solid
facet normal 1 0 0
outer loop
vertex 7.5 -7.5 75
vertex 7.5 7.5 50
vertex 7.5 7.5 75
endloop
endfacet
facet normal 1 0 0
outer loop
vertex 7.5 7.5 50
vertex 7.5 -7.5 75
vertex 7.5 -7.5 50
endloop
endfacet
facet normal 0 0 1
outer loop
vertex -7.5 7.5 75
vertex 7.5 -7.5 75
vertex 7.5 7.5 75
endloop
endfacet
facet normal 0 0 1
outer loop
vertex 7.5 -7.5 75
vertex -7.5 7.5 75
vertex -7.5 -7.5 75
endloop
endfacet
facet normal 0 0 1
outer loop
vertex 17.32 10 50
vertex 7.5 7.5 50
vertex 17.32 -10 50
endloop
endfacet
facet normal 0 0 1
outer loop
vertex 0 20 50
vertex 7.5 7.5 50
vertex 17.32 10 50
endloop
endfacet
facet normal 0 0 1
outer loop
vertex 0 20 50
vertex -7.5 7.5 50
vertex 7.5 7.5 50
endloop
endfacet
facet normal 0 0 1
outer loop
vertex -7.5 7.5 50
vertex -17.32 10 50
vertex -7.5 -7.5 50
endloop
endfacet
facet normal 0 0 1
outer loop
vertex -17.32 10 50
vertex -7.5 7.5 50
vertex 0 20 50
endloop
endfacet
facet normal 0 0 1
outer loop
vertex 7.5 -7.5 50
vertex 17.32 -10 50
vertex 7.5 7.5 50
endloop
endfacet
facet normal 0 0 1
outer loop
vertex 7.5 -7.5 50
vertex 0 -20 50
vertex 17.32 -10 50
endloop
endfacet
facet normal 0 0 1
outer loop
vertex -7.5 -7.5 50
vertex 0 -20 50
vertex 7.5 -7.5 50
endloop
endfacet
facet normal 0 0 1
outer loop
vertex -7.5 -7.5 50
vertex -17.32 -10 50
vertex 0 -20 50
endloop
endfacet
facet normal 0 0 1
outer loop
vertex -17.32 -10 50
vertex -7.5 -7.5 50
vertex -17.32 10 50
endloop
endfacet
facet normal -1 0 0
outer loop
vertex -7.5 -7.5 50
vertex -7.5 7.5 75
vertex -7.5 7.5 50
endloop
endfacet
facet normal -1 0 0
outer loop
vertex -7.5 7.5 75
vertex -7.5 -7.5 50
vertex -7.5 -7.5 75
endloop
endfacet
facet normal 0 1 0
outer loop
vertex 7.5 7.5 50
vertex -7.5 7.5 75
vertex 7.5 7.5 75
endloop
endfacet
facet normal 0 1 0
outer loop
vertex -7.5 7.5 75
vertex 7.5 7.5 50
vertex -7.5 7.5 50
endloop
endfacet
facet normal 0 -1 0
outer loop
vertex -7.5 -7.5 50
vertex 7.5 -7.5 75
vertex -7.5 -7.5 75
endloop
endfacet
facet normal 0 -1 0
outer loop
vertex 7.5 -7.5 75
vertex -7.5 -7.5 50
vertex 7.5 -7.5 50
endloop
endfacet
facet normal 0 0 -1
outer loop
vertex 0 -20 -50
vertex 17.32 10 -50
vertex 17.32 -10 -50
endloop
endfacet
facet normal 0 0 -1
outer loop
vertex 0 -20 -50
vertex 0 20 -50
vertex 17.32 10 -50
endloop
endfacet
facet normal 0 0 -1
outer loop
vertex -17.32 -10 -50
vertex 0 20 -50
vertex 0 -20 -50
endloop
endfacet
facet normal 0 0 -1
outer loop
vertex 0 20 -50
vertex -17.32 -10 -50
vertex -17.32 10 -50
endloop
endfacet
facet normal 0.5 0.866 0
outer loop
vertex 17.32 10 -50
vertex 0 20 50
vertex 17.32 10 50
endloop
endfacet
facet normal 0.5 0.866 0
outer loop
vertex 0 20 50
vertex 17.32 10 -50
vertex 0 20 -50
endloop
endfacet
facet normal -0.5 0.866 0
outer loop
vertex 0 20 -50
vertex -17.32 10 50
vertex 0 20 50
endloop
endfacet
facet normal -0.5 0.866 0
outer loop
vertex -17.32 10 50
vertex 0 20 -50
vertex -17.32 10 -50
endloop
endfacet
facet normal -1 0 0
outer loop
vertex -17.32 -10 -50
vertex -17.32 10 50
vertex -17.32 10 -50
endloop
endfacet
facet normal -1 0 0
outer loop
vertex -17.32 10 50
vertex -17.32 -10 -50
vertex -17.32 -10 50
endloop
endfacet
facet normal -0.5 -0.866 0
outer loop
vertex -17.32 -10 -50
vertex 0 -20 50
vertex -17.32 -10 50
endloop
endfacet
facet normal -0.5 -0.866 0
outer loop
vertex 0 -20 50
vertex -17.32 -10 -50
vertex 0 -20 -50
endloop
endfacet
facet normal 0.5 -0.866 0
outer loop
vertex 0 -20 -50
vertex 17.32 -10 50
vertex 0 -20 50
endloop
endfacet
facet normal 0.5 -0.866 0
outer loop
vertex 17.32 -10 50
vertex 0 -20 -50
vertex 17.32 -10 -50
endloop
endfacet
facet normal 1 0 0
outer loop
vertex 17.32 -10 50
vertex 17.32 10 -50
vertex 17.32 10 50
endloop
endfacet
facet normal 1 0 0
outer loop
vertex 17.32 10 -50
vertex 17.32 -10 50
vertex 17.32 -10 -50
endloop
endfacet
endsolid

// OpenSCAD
// file: libpeginhole.scad
/*
 *  Copyright 2024-2025 AGH Center of Excellence in Artificial Intelligence
 *
 *  Licensed under the Apache License, Version 2.0 (the "License");
 *  you may not use this file except in compliance with the License.
 *  You may obtain a copy of the License at
 *
 *      http://www.apache.org/licenses/LICENSE-2.0
 *
 *  Unless required by applicable law or agreed to in writing, software
 *  distributed under the License is distributed on an "AS IS" BASIS,
 *  WITHOUT WARRANTIES OR CONDITIONS OF ANY KIND, either express or implied.
 *  See the License for the specific language governing permissions and
 *  limitations under the License.
 */
EPS = 0.001;

function circle_coordinate(x, r, p) = [ r * cos(x + p), r *sin(x + p) ];
function regular_shape_vertices(n = 3, r = 1, phase = 0) = [for (t = [0:360 / n:360 - EPS]) circle_coordinate(t, r, phase)];

function hole_diameter(vertices, peg_diameter, tolerance = 0) = tolerance + peg_diameter * cos(180 / vertices);
function angle_offset(vertices) = (360 / vertices) / 2;


/* Makes a single peg in form of regular prism
-  Args:
- @vertices: int - number of the base polygon vertices
- @diameter: num - the diameter of the circle to construct the vertices
- @height: num - the height of the prism
- @angle_offset: num - rotation of all vertices
- @is_cylinder: bool - flag to convert prism into cylinder
*/
module regular_prism(vertices, diameter, height, angle_offset, is_cylinder = false)
{
	if (is_cylinder) {
		cylinder(h = height, r = diameter / 2, center = true);
	} else if (vertices < 3) {
		echo("ERROR: Can't construct polygon with less than 3 vertices!");
	} else {
		linear_extrude(height = height, center = true) {
			if (vertices == 4) {
				square(diameter / sqrt(2), center = true);
			} else {
				points = regular_shape_vertices(n = vertices, r = diameter / 2, phase = angle_offset);
				polygon(points);
			}
		}
	}
}

/* Makes a single peghole
-  Args:
- @slot_size: num - the side of the box
- @depth: num - the thickness of the surface for insertion
- @height: num - the height of the whole box
- @leg_width: num - the side of the supporting legs
*/
module single_insertion_box(slot_size, depth, height, leg_width) {
	difference() {
		// Insertion surface
		cube([ slot_size, slot_size, height ], center = true);

		// Clearance (4 legs)
		translate([ 0, 0, -depth ]) cube([ slot_size + EPS, slot_size - 2 * leg_width, height ], center = true);
		translate([ 0, 0, -depth ]) cube([ slot_size - 2 * leg_width, slot_size + EPS, height ], center = true);

		// Peghole
		children(0);
	}
}

/* Makes multiple pegholes
-  Args:
- @slot_size: num - the side of the box
- @array_size: vec[int, int] - array dimensions of the holes grid
- @depth: num - the thickness of the surface for insertion
- @height: num - the height of the whole box
- @leg_width: num - the side of the supporting legs
*/
module multiple_insertion_box(slot_size, array_size, depth, height, leg_width) {
	box_dims = slot_size * array_size;
	difference() {
		// Insertion surface
		cube([ box_dims.x, box_dims.y, height ], center = true);

		// Clearance (4 legs)
		translate([ 0, 0, -depth ]) cube([ box_dims.x + EPS, box_dims.y - 2 * leg_width, height ], center = true);
		translate([ 0, 0, -depth ]) cube([ box_dims.x - 2 * leg_width, box_dims.y + EPS, height ], center = true);

		// Pegholes array
		array_offset = -box_dims / 2 + [ slot_size, slot_size ] / 2;
		for (cnt_y = [0:1:array_size.y - EPS]) {
			for (cnt_x = [0:1:array_size.x - EPS]) {
				dx = slot_size * cnt_x;
				dy = slot_size * cnt_y;
				child_idx = ((cnt_y * array_size.x) + cnt_x) % $children;

				translate([ array_offset.x + dx, array_offset.y + dy, 0 ]) children(child_idx);
			}
		}
	}
}
// main file
/*
 *  Copyright 2025 AGH Center of Excellence in Artificial Intelligence
 *
 *  Licensed under the Apache License, Version 2.0 (the "License");
 *  you may not use this file except in compliance with the License.
 *  You may obtain a copy of the License at
 *
 *      http://www.apache.org/licenses/LICENSE-2.0
 *
 *  Unless required by applicable law or agreed to in writing, software
 *  distributed under the License is distributed on an "AS IS" BASIS,
 *  WITHOUT WARRANTIES OR CONDITIONS OF ANY KIND, either express or implied.
 *  See the License for the specific language governing permissions and
 *  limitations under the License.
 */
use <libpeginhole.scad>
$fa = 1;
$fs = 0.4;

// Handle
handle_rotation = [ 0, 0, 0 ];  // in degs
handle_diameter = 15;
handle_height = 25;

// Peg
rotation = [ 0, 0, 0 ];  // in degs
vertices = 6;
diameter = 40;
height = 100;
is_cylinder = false;

union() {
	// Handle
	rotate(handle_rotation)
	translate([ 0, 0, height / 2 + handle_height / 2 ])
	    cube([ handle_diameter, handle_diameter, handle_height ], center = true);
	// Peg
	rotate(rotation)
	regular_prism(vertices = vertices, diameter = diameter, height = height, angle_offset = angle_offset(vertices),
	              is_cylinder = is_cylinder);
};
